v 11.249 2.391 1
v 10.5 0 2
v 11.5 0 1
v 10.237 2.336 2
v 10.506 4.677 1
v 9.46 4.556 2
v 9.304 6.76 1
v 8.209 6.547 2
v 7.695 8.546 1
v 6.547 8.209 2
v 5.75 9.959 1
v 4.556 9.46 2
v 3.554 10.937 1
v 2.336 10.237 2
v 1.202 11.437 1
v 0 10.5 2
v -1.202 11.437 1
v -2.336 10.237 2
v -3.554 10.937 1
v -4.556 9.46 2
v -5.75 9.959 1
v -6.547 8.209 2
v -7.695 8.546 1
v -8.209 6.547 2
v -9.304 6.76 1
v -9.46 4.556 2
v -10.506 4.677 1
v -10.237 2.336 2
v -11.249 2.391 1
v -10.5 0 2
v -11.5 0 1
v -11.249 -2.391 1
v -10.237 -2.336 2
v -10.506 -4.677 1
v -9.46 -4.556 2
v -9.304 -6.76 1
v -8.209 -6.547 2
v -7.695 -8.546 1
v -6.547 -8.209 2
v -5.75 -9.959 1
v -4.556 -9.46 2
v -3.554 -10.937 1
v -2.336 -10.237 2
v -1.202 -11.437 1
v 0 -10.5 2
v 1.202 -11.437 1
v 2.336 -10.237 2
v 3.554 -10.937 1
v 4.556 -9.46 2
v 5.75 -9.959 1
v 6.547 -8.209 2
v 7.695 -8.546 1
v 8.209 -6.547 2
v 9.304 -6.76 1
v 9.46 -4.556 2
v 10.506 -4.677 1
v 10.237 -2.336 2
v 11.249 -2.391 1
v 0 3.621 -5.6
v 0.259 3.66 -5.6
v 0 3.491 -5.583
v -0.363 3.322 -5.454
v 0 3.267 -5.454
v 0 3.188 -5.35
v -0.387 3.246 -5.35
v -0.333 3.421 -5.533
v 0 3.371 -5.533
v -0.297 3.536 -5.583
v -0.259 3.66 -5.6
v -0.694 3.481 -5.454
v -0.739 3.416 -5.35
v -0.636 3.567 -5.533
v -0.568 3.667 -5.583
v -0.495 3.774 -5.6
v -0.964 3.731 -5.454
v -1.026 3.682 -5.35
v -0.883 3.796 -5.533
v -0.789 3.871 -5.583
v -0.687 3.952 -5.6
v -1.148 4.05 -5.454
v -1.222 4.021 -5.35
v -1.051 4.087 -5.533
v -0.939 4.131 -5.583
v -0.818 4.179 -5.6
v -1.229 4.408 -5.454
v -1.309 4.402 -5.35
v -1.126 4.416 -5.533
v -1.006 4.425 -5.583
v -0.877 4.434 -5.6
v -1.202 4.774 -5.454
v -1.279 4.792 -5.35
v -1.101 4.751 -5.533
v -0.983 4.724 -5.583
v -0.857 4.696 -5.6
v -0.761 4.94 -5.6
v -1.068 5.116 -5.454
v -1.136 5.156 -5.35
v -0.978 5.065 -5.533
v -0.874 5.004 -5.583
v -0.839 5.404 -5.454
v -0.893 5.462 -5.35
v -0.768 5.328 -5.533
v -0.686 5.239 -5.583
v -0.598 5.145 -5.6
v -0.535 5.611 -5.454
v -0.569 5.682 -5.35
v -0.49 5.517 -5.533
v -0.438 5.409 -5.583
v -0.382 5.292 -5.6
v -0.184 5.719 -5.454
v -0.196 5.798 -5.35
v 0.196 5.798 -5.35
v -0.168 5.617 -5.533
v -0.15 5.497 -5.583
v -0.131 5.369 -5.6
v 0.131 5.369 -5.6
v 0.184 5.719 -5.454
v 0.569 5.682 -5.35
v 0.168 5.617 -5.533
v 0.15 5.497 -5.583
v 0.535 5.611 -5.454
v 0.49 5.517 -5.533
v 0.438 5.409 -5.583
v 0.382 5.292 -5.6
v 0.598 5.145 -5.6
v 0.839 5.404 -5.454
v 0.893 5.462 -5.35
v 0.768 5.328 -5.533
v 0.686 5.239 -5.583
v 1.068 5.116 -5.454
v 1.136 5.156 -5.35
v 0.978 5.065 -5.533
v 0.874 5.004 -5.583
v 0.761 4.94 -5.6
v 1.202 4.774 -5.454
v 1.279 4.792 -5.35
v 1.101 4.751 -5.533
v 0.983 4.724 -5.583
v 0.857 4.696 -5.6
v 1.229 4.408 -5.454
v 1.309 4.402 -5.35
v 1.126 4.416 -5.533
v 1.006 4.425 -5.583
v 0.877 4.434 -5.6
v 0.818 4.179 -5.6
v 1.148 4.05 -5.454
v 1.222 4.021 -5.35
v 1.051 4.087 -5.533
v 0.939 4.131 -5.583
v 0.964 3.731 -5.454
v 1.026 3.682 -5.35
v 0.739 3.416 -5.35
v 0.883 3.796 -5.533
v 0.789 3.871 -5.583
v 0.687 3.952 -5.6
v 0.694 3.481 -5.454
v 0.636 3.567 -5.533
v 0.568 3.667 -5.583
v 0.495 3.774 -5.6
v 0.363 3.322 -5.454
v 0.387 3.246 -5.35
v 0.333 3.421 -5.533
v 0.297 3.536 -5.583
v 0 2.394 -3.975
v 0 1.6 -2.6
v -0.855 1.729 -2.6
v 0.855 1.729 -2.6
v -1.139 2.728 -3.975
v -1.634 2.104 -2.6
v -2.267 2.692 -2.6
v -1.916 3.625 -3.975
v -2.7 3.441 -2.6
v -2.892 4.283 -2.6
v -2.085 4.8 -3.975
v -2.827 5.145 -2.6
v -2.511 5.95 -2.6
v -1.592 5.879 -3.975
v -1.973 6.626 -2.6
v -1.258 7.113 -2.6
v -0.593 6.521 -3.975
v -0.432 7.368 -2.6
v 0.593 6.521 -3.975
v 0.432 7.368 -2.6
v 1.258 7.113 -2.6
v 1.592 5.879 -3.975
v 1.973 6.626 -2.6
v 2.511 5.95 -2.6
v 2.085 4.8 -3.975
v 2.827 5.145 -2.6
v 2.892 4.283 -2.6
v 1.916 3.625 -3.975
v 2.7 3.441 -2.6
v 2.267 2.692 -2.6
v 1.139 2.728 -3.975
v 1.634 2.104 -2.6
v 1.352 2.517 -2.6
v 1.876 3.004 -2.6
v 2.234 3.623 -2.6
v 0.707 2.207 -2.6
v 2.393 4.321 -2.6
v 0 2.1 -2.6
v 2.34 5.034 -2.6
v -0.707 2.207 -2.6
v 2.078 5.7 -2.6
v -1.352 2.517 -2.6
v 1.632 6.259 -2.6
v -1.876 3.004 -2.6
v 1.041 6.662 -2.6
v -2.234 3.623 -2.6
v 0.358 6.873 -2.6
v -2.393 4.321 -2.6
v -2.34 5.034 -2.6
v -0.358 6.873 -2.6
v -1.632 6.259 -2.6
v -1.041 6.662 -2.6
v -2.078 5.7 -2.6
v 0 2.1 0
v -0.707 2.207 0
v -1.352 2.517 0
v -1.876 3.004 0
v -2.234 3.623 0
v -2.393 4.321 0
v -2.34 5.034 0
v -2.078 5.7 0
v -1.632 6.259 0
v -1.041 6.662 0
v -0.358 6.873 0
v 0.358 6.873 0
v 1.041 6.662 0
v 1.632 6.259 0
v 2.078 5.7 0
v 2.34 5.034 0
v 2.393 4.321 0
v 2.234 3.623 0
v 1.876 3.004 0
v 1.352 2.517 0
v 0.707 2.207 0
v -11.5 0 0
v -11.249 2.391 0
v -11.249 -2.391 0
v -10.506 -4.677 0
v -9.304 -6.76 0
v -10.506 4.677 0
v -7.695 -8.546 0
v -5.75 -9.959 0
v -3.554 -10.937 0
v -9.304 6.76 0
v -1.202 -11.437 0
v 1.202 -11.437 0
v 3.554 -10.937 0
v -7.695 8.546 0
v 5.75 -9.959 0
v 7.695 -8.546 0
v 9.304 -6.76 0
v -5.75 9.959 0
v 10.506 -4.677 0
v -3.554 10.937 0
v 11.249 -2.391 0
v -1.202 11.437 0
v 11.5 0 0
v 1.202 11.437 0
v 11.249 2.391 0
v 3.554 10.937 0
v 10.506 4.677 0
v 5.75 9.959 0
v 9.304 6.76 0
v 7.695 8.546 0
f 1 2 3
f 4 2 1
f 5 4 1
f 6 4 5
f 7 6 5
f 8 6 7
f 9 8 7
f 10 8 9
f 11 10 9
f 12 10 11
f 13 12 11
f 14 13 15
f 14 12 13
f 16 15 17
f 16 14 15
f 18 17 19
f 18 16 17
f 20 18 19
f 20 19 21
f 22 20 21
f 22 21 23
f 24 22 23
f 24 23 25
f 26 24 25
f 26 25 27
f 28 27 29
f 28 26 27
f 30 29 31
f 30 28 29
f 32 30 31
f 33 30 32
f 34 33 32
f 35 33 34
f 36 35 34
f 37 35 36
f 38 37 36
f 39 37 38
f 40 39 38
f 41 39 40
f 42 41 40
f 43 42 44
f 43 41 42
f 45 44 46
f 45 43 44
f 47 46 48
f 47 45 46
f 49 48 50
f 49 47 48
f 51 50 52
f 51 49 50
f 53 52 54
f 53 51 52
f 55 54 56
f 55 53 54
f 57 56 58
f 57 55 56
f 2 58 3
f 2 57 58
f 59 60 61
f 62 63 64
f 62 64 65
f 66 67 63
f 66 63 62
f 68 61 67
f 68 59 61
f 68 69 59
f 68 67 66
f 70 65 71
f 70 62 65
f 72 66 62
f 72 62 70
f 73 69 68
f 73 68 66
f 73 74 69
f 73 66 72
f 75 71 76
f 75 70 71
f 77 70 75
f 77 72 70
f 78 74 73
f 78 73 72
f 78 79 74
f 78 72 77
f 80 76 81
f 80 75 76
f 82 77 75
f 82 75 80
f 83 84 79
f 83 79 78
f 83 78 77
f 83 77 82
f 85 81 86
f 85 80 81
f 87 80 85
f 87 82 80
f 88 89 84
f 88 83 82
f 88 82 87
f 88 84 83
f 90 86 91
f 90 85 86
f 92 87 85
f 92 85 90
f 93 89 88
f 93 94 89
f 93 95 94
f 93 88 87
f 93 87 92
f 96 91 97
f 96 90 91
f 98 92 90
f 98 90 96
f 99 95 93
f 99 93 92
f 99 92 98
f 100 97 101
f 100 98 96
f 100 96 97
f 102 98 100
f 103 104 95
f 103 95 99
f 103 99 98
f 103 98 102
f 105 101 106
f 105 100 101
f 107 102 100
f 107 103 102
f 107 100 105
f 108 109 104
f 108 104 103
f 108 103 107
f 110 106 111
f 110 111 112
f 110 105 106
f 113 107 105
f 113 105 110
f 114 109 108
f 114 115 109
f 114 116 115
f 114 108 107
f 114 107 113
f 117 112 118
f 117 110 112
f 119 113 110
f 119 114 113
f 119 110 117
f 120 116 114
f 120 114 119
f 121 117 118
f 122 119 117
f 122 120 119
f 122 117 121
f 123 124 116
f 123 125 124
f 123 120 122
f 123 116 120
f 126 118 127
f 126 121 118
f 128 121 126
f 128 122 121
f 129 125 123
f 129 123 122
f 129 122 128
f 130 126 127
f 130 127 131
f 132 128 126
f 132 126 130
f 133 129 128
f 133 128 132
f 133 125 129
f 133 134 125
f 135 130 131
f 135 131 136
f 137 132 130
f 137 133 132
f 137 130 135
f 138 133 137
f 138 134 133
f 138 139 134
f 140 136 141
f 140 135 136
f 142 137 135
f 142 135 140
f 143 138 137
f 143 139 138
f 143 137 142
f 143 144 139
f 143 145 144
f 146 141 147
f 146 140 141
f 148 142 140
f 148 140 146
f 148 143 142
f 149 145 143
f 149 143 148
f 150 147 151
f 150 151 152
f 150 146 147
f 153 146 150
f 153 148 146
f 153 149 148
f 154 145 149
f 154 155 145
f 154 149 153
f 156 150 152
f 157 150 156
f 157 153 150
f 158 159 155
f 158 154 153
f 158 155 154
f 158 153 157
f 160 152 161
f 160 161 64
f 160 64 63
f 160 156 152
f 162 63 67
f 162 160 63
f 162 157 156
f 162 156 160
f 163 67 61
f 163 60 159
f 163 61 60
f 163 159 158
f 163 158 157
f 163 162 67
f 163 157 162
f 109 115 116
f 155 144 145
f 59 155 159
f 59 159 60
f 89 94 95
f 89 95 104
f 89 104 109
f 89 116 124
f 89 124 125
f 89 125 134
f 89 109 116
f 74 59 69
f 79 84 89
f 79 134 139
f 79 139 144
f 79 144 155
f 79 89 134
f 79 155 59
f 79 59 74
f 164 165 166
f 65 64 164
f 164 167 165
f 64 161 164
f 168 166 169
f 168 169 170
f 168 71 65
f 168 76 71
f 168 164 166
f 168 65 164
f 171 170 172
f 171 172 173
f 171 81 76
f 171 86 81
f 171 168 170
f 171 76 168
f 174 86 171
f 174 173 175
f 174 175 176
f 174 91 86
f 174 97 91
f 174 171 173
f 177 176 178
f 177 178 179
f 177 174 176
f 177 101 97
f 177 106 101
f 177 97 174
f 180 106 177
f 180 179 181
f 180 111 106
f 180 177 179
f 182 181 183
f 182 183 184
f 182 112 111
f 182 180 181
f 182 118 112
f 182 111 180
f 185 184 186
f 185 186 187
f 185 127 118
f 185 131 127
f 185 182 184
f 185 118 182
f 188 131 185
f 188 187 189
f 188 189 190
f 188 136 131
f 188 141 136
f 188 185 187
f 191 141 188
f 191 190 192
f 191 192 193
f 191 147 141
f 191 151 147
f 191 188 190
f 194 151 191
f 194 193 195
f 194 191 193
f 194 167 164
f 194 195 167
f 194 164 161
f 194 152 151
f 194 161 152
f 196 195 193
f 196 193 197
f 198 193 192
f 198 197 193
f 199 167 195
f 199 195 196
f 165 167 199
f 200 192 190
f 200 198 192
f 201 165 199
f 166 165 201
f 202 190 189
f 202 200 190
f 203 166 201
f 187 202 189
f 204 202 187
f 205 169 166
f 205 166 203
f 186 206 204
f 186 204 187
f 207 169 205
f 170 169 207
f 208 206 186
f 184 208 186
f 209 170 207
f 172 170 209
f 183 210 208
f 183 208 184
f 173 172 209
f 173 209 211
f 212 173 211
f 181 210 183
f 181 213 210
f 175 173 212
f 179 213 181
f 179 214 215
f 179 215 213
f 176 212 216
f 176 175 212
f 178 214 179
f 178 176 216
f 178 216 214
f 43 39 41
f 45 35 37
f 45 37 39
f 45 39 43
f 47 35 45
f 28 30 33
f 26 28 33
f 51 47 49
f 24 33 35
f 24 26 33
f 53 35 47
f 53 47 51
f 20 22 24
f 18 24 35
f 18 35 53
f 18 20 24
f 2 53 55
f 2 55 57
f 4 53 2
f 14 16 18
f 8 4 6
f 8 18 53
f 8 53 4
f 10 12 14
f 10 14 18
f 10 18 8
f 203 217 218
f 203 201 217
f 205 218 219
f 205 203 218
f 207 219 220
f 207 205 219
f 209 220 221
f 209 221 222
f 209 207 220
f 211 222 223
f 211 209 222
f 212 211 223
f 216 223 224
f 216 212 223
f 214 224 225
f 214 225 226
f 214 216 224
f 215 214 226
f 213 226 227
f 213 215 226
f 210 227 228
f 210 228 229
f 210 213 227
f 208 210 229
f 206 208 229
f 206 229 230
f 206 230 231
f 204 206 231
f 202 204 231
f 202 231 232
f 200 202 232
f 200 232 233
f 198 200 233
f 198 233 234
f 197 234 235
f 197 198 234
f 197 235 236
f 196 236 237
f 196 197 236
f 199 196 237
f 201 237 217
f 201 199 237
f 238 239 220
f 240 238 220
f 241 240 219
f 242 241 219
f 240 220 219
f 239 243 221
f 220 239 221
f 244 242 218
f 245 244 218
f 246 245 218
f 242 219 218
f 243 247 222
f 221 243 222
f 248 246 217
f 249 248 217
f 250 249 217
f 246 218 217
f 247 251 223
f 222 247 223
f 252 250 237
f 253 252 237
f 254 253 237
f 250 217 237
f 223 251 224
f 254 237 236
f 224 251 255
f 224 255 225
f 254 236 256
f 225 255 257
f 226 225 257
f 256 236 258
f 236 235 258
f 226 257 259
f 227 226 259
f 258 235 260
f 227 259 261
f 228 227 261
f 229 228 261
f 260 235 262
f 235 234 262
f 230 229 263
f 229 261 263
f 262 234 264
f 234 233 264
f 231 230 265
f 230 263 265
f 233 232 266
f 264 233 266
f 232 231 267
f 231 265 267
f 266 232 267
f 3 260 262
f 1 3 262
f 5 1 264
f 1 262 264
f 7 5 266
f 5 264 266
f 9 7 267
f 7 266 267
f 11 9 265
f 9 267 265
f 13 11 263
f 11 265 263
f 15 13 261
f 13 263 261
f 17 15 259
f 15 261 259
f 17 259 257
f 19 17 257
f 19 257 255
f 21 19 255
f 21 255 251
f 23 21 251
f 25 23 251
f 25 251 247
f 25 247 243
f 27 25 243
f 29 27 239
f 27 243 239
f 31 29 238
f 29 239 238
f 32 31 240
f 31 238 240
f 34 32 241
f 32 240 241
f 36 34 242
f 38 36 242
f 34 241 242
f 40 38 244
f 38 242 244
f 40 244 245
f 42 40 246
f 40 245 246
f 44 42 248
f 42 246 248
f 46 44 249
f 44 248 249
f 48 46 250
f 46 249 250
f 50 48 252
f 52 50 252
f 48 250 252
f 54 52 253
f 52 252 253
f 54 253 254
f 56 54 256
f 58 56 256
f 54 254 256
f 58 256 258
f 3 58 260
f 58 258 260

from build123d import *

# Parameters (mm, degrees)
SKETCH1_R           = 11.5
BOSS_EXTRUDE1_DEPTH = 2
CHAMFER1_SIZE       = 1
FILLET2_R           = 0.5


with BuildPart() as part:
    # Sketch1 → Boss-Extrude1 (new body)
    with BuildSketch(Plane.XY):
        Circle(SKETCH1_R)
    extrude(amount=BOSS_EXTRUDE1_DEPTH)

    # Sketch3 → Revolve1 (revolve)
    with BuildSketch(Plane(origin=(0, 0, 0), x_dir=(0, 0, -1), z_dir=(1, 0, 0)), mode=Mode.PRIVATE) as revolve1_sk:
        Polygon((0, 4.5), (0, 6.9), (2.6, 6.9), (2.6, 7.4), (5.6, 5.667949192), (5.6, 4.5), align=None)
    revolve(revolve1_sk.sketch.rotate(Axis((0, 4.5, 0), (0, 0, -1)), 180), axis=Axis((0, 4.5, 0), (0, 0, -1)))

    # Chamfer1
    chamfer1_edges = [part.edges().sort_by_distance(p)[0] for p in [
        (-11.5, 0, 2),
    ]]
    chamfer(chamfer1_edges, length=CHAMFER1_SIZE)

    # Fillet2
    fillet2_edges = [part.edges().sort_by_distance(p)[0] for p in [
        (0, 5.667949192, -5.6),
    ]]
    fillet(fillet2_edges, radius=FILLET2_R)


solid = part.part
